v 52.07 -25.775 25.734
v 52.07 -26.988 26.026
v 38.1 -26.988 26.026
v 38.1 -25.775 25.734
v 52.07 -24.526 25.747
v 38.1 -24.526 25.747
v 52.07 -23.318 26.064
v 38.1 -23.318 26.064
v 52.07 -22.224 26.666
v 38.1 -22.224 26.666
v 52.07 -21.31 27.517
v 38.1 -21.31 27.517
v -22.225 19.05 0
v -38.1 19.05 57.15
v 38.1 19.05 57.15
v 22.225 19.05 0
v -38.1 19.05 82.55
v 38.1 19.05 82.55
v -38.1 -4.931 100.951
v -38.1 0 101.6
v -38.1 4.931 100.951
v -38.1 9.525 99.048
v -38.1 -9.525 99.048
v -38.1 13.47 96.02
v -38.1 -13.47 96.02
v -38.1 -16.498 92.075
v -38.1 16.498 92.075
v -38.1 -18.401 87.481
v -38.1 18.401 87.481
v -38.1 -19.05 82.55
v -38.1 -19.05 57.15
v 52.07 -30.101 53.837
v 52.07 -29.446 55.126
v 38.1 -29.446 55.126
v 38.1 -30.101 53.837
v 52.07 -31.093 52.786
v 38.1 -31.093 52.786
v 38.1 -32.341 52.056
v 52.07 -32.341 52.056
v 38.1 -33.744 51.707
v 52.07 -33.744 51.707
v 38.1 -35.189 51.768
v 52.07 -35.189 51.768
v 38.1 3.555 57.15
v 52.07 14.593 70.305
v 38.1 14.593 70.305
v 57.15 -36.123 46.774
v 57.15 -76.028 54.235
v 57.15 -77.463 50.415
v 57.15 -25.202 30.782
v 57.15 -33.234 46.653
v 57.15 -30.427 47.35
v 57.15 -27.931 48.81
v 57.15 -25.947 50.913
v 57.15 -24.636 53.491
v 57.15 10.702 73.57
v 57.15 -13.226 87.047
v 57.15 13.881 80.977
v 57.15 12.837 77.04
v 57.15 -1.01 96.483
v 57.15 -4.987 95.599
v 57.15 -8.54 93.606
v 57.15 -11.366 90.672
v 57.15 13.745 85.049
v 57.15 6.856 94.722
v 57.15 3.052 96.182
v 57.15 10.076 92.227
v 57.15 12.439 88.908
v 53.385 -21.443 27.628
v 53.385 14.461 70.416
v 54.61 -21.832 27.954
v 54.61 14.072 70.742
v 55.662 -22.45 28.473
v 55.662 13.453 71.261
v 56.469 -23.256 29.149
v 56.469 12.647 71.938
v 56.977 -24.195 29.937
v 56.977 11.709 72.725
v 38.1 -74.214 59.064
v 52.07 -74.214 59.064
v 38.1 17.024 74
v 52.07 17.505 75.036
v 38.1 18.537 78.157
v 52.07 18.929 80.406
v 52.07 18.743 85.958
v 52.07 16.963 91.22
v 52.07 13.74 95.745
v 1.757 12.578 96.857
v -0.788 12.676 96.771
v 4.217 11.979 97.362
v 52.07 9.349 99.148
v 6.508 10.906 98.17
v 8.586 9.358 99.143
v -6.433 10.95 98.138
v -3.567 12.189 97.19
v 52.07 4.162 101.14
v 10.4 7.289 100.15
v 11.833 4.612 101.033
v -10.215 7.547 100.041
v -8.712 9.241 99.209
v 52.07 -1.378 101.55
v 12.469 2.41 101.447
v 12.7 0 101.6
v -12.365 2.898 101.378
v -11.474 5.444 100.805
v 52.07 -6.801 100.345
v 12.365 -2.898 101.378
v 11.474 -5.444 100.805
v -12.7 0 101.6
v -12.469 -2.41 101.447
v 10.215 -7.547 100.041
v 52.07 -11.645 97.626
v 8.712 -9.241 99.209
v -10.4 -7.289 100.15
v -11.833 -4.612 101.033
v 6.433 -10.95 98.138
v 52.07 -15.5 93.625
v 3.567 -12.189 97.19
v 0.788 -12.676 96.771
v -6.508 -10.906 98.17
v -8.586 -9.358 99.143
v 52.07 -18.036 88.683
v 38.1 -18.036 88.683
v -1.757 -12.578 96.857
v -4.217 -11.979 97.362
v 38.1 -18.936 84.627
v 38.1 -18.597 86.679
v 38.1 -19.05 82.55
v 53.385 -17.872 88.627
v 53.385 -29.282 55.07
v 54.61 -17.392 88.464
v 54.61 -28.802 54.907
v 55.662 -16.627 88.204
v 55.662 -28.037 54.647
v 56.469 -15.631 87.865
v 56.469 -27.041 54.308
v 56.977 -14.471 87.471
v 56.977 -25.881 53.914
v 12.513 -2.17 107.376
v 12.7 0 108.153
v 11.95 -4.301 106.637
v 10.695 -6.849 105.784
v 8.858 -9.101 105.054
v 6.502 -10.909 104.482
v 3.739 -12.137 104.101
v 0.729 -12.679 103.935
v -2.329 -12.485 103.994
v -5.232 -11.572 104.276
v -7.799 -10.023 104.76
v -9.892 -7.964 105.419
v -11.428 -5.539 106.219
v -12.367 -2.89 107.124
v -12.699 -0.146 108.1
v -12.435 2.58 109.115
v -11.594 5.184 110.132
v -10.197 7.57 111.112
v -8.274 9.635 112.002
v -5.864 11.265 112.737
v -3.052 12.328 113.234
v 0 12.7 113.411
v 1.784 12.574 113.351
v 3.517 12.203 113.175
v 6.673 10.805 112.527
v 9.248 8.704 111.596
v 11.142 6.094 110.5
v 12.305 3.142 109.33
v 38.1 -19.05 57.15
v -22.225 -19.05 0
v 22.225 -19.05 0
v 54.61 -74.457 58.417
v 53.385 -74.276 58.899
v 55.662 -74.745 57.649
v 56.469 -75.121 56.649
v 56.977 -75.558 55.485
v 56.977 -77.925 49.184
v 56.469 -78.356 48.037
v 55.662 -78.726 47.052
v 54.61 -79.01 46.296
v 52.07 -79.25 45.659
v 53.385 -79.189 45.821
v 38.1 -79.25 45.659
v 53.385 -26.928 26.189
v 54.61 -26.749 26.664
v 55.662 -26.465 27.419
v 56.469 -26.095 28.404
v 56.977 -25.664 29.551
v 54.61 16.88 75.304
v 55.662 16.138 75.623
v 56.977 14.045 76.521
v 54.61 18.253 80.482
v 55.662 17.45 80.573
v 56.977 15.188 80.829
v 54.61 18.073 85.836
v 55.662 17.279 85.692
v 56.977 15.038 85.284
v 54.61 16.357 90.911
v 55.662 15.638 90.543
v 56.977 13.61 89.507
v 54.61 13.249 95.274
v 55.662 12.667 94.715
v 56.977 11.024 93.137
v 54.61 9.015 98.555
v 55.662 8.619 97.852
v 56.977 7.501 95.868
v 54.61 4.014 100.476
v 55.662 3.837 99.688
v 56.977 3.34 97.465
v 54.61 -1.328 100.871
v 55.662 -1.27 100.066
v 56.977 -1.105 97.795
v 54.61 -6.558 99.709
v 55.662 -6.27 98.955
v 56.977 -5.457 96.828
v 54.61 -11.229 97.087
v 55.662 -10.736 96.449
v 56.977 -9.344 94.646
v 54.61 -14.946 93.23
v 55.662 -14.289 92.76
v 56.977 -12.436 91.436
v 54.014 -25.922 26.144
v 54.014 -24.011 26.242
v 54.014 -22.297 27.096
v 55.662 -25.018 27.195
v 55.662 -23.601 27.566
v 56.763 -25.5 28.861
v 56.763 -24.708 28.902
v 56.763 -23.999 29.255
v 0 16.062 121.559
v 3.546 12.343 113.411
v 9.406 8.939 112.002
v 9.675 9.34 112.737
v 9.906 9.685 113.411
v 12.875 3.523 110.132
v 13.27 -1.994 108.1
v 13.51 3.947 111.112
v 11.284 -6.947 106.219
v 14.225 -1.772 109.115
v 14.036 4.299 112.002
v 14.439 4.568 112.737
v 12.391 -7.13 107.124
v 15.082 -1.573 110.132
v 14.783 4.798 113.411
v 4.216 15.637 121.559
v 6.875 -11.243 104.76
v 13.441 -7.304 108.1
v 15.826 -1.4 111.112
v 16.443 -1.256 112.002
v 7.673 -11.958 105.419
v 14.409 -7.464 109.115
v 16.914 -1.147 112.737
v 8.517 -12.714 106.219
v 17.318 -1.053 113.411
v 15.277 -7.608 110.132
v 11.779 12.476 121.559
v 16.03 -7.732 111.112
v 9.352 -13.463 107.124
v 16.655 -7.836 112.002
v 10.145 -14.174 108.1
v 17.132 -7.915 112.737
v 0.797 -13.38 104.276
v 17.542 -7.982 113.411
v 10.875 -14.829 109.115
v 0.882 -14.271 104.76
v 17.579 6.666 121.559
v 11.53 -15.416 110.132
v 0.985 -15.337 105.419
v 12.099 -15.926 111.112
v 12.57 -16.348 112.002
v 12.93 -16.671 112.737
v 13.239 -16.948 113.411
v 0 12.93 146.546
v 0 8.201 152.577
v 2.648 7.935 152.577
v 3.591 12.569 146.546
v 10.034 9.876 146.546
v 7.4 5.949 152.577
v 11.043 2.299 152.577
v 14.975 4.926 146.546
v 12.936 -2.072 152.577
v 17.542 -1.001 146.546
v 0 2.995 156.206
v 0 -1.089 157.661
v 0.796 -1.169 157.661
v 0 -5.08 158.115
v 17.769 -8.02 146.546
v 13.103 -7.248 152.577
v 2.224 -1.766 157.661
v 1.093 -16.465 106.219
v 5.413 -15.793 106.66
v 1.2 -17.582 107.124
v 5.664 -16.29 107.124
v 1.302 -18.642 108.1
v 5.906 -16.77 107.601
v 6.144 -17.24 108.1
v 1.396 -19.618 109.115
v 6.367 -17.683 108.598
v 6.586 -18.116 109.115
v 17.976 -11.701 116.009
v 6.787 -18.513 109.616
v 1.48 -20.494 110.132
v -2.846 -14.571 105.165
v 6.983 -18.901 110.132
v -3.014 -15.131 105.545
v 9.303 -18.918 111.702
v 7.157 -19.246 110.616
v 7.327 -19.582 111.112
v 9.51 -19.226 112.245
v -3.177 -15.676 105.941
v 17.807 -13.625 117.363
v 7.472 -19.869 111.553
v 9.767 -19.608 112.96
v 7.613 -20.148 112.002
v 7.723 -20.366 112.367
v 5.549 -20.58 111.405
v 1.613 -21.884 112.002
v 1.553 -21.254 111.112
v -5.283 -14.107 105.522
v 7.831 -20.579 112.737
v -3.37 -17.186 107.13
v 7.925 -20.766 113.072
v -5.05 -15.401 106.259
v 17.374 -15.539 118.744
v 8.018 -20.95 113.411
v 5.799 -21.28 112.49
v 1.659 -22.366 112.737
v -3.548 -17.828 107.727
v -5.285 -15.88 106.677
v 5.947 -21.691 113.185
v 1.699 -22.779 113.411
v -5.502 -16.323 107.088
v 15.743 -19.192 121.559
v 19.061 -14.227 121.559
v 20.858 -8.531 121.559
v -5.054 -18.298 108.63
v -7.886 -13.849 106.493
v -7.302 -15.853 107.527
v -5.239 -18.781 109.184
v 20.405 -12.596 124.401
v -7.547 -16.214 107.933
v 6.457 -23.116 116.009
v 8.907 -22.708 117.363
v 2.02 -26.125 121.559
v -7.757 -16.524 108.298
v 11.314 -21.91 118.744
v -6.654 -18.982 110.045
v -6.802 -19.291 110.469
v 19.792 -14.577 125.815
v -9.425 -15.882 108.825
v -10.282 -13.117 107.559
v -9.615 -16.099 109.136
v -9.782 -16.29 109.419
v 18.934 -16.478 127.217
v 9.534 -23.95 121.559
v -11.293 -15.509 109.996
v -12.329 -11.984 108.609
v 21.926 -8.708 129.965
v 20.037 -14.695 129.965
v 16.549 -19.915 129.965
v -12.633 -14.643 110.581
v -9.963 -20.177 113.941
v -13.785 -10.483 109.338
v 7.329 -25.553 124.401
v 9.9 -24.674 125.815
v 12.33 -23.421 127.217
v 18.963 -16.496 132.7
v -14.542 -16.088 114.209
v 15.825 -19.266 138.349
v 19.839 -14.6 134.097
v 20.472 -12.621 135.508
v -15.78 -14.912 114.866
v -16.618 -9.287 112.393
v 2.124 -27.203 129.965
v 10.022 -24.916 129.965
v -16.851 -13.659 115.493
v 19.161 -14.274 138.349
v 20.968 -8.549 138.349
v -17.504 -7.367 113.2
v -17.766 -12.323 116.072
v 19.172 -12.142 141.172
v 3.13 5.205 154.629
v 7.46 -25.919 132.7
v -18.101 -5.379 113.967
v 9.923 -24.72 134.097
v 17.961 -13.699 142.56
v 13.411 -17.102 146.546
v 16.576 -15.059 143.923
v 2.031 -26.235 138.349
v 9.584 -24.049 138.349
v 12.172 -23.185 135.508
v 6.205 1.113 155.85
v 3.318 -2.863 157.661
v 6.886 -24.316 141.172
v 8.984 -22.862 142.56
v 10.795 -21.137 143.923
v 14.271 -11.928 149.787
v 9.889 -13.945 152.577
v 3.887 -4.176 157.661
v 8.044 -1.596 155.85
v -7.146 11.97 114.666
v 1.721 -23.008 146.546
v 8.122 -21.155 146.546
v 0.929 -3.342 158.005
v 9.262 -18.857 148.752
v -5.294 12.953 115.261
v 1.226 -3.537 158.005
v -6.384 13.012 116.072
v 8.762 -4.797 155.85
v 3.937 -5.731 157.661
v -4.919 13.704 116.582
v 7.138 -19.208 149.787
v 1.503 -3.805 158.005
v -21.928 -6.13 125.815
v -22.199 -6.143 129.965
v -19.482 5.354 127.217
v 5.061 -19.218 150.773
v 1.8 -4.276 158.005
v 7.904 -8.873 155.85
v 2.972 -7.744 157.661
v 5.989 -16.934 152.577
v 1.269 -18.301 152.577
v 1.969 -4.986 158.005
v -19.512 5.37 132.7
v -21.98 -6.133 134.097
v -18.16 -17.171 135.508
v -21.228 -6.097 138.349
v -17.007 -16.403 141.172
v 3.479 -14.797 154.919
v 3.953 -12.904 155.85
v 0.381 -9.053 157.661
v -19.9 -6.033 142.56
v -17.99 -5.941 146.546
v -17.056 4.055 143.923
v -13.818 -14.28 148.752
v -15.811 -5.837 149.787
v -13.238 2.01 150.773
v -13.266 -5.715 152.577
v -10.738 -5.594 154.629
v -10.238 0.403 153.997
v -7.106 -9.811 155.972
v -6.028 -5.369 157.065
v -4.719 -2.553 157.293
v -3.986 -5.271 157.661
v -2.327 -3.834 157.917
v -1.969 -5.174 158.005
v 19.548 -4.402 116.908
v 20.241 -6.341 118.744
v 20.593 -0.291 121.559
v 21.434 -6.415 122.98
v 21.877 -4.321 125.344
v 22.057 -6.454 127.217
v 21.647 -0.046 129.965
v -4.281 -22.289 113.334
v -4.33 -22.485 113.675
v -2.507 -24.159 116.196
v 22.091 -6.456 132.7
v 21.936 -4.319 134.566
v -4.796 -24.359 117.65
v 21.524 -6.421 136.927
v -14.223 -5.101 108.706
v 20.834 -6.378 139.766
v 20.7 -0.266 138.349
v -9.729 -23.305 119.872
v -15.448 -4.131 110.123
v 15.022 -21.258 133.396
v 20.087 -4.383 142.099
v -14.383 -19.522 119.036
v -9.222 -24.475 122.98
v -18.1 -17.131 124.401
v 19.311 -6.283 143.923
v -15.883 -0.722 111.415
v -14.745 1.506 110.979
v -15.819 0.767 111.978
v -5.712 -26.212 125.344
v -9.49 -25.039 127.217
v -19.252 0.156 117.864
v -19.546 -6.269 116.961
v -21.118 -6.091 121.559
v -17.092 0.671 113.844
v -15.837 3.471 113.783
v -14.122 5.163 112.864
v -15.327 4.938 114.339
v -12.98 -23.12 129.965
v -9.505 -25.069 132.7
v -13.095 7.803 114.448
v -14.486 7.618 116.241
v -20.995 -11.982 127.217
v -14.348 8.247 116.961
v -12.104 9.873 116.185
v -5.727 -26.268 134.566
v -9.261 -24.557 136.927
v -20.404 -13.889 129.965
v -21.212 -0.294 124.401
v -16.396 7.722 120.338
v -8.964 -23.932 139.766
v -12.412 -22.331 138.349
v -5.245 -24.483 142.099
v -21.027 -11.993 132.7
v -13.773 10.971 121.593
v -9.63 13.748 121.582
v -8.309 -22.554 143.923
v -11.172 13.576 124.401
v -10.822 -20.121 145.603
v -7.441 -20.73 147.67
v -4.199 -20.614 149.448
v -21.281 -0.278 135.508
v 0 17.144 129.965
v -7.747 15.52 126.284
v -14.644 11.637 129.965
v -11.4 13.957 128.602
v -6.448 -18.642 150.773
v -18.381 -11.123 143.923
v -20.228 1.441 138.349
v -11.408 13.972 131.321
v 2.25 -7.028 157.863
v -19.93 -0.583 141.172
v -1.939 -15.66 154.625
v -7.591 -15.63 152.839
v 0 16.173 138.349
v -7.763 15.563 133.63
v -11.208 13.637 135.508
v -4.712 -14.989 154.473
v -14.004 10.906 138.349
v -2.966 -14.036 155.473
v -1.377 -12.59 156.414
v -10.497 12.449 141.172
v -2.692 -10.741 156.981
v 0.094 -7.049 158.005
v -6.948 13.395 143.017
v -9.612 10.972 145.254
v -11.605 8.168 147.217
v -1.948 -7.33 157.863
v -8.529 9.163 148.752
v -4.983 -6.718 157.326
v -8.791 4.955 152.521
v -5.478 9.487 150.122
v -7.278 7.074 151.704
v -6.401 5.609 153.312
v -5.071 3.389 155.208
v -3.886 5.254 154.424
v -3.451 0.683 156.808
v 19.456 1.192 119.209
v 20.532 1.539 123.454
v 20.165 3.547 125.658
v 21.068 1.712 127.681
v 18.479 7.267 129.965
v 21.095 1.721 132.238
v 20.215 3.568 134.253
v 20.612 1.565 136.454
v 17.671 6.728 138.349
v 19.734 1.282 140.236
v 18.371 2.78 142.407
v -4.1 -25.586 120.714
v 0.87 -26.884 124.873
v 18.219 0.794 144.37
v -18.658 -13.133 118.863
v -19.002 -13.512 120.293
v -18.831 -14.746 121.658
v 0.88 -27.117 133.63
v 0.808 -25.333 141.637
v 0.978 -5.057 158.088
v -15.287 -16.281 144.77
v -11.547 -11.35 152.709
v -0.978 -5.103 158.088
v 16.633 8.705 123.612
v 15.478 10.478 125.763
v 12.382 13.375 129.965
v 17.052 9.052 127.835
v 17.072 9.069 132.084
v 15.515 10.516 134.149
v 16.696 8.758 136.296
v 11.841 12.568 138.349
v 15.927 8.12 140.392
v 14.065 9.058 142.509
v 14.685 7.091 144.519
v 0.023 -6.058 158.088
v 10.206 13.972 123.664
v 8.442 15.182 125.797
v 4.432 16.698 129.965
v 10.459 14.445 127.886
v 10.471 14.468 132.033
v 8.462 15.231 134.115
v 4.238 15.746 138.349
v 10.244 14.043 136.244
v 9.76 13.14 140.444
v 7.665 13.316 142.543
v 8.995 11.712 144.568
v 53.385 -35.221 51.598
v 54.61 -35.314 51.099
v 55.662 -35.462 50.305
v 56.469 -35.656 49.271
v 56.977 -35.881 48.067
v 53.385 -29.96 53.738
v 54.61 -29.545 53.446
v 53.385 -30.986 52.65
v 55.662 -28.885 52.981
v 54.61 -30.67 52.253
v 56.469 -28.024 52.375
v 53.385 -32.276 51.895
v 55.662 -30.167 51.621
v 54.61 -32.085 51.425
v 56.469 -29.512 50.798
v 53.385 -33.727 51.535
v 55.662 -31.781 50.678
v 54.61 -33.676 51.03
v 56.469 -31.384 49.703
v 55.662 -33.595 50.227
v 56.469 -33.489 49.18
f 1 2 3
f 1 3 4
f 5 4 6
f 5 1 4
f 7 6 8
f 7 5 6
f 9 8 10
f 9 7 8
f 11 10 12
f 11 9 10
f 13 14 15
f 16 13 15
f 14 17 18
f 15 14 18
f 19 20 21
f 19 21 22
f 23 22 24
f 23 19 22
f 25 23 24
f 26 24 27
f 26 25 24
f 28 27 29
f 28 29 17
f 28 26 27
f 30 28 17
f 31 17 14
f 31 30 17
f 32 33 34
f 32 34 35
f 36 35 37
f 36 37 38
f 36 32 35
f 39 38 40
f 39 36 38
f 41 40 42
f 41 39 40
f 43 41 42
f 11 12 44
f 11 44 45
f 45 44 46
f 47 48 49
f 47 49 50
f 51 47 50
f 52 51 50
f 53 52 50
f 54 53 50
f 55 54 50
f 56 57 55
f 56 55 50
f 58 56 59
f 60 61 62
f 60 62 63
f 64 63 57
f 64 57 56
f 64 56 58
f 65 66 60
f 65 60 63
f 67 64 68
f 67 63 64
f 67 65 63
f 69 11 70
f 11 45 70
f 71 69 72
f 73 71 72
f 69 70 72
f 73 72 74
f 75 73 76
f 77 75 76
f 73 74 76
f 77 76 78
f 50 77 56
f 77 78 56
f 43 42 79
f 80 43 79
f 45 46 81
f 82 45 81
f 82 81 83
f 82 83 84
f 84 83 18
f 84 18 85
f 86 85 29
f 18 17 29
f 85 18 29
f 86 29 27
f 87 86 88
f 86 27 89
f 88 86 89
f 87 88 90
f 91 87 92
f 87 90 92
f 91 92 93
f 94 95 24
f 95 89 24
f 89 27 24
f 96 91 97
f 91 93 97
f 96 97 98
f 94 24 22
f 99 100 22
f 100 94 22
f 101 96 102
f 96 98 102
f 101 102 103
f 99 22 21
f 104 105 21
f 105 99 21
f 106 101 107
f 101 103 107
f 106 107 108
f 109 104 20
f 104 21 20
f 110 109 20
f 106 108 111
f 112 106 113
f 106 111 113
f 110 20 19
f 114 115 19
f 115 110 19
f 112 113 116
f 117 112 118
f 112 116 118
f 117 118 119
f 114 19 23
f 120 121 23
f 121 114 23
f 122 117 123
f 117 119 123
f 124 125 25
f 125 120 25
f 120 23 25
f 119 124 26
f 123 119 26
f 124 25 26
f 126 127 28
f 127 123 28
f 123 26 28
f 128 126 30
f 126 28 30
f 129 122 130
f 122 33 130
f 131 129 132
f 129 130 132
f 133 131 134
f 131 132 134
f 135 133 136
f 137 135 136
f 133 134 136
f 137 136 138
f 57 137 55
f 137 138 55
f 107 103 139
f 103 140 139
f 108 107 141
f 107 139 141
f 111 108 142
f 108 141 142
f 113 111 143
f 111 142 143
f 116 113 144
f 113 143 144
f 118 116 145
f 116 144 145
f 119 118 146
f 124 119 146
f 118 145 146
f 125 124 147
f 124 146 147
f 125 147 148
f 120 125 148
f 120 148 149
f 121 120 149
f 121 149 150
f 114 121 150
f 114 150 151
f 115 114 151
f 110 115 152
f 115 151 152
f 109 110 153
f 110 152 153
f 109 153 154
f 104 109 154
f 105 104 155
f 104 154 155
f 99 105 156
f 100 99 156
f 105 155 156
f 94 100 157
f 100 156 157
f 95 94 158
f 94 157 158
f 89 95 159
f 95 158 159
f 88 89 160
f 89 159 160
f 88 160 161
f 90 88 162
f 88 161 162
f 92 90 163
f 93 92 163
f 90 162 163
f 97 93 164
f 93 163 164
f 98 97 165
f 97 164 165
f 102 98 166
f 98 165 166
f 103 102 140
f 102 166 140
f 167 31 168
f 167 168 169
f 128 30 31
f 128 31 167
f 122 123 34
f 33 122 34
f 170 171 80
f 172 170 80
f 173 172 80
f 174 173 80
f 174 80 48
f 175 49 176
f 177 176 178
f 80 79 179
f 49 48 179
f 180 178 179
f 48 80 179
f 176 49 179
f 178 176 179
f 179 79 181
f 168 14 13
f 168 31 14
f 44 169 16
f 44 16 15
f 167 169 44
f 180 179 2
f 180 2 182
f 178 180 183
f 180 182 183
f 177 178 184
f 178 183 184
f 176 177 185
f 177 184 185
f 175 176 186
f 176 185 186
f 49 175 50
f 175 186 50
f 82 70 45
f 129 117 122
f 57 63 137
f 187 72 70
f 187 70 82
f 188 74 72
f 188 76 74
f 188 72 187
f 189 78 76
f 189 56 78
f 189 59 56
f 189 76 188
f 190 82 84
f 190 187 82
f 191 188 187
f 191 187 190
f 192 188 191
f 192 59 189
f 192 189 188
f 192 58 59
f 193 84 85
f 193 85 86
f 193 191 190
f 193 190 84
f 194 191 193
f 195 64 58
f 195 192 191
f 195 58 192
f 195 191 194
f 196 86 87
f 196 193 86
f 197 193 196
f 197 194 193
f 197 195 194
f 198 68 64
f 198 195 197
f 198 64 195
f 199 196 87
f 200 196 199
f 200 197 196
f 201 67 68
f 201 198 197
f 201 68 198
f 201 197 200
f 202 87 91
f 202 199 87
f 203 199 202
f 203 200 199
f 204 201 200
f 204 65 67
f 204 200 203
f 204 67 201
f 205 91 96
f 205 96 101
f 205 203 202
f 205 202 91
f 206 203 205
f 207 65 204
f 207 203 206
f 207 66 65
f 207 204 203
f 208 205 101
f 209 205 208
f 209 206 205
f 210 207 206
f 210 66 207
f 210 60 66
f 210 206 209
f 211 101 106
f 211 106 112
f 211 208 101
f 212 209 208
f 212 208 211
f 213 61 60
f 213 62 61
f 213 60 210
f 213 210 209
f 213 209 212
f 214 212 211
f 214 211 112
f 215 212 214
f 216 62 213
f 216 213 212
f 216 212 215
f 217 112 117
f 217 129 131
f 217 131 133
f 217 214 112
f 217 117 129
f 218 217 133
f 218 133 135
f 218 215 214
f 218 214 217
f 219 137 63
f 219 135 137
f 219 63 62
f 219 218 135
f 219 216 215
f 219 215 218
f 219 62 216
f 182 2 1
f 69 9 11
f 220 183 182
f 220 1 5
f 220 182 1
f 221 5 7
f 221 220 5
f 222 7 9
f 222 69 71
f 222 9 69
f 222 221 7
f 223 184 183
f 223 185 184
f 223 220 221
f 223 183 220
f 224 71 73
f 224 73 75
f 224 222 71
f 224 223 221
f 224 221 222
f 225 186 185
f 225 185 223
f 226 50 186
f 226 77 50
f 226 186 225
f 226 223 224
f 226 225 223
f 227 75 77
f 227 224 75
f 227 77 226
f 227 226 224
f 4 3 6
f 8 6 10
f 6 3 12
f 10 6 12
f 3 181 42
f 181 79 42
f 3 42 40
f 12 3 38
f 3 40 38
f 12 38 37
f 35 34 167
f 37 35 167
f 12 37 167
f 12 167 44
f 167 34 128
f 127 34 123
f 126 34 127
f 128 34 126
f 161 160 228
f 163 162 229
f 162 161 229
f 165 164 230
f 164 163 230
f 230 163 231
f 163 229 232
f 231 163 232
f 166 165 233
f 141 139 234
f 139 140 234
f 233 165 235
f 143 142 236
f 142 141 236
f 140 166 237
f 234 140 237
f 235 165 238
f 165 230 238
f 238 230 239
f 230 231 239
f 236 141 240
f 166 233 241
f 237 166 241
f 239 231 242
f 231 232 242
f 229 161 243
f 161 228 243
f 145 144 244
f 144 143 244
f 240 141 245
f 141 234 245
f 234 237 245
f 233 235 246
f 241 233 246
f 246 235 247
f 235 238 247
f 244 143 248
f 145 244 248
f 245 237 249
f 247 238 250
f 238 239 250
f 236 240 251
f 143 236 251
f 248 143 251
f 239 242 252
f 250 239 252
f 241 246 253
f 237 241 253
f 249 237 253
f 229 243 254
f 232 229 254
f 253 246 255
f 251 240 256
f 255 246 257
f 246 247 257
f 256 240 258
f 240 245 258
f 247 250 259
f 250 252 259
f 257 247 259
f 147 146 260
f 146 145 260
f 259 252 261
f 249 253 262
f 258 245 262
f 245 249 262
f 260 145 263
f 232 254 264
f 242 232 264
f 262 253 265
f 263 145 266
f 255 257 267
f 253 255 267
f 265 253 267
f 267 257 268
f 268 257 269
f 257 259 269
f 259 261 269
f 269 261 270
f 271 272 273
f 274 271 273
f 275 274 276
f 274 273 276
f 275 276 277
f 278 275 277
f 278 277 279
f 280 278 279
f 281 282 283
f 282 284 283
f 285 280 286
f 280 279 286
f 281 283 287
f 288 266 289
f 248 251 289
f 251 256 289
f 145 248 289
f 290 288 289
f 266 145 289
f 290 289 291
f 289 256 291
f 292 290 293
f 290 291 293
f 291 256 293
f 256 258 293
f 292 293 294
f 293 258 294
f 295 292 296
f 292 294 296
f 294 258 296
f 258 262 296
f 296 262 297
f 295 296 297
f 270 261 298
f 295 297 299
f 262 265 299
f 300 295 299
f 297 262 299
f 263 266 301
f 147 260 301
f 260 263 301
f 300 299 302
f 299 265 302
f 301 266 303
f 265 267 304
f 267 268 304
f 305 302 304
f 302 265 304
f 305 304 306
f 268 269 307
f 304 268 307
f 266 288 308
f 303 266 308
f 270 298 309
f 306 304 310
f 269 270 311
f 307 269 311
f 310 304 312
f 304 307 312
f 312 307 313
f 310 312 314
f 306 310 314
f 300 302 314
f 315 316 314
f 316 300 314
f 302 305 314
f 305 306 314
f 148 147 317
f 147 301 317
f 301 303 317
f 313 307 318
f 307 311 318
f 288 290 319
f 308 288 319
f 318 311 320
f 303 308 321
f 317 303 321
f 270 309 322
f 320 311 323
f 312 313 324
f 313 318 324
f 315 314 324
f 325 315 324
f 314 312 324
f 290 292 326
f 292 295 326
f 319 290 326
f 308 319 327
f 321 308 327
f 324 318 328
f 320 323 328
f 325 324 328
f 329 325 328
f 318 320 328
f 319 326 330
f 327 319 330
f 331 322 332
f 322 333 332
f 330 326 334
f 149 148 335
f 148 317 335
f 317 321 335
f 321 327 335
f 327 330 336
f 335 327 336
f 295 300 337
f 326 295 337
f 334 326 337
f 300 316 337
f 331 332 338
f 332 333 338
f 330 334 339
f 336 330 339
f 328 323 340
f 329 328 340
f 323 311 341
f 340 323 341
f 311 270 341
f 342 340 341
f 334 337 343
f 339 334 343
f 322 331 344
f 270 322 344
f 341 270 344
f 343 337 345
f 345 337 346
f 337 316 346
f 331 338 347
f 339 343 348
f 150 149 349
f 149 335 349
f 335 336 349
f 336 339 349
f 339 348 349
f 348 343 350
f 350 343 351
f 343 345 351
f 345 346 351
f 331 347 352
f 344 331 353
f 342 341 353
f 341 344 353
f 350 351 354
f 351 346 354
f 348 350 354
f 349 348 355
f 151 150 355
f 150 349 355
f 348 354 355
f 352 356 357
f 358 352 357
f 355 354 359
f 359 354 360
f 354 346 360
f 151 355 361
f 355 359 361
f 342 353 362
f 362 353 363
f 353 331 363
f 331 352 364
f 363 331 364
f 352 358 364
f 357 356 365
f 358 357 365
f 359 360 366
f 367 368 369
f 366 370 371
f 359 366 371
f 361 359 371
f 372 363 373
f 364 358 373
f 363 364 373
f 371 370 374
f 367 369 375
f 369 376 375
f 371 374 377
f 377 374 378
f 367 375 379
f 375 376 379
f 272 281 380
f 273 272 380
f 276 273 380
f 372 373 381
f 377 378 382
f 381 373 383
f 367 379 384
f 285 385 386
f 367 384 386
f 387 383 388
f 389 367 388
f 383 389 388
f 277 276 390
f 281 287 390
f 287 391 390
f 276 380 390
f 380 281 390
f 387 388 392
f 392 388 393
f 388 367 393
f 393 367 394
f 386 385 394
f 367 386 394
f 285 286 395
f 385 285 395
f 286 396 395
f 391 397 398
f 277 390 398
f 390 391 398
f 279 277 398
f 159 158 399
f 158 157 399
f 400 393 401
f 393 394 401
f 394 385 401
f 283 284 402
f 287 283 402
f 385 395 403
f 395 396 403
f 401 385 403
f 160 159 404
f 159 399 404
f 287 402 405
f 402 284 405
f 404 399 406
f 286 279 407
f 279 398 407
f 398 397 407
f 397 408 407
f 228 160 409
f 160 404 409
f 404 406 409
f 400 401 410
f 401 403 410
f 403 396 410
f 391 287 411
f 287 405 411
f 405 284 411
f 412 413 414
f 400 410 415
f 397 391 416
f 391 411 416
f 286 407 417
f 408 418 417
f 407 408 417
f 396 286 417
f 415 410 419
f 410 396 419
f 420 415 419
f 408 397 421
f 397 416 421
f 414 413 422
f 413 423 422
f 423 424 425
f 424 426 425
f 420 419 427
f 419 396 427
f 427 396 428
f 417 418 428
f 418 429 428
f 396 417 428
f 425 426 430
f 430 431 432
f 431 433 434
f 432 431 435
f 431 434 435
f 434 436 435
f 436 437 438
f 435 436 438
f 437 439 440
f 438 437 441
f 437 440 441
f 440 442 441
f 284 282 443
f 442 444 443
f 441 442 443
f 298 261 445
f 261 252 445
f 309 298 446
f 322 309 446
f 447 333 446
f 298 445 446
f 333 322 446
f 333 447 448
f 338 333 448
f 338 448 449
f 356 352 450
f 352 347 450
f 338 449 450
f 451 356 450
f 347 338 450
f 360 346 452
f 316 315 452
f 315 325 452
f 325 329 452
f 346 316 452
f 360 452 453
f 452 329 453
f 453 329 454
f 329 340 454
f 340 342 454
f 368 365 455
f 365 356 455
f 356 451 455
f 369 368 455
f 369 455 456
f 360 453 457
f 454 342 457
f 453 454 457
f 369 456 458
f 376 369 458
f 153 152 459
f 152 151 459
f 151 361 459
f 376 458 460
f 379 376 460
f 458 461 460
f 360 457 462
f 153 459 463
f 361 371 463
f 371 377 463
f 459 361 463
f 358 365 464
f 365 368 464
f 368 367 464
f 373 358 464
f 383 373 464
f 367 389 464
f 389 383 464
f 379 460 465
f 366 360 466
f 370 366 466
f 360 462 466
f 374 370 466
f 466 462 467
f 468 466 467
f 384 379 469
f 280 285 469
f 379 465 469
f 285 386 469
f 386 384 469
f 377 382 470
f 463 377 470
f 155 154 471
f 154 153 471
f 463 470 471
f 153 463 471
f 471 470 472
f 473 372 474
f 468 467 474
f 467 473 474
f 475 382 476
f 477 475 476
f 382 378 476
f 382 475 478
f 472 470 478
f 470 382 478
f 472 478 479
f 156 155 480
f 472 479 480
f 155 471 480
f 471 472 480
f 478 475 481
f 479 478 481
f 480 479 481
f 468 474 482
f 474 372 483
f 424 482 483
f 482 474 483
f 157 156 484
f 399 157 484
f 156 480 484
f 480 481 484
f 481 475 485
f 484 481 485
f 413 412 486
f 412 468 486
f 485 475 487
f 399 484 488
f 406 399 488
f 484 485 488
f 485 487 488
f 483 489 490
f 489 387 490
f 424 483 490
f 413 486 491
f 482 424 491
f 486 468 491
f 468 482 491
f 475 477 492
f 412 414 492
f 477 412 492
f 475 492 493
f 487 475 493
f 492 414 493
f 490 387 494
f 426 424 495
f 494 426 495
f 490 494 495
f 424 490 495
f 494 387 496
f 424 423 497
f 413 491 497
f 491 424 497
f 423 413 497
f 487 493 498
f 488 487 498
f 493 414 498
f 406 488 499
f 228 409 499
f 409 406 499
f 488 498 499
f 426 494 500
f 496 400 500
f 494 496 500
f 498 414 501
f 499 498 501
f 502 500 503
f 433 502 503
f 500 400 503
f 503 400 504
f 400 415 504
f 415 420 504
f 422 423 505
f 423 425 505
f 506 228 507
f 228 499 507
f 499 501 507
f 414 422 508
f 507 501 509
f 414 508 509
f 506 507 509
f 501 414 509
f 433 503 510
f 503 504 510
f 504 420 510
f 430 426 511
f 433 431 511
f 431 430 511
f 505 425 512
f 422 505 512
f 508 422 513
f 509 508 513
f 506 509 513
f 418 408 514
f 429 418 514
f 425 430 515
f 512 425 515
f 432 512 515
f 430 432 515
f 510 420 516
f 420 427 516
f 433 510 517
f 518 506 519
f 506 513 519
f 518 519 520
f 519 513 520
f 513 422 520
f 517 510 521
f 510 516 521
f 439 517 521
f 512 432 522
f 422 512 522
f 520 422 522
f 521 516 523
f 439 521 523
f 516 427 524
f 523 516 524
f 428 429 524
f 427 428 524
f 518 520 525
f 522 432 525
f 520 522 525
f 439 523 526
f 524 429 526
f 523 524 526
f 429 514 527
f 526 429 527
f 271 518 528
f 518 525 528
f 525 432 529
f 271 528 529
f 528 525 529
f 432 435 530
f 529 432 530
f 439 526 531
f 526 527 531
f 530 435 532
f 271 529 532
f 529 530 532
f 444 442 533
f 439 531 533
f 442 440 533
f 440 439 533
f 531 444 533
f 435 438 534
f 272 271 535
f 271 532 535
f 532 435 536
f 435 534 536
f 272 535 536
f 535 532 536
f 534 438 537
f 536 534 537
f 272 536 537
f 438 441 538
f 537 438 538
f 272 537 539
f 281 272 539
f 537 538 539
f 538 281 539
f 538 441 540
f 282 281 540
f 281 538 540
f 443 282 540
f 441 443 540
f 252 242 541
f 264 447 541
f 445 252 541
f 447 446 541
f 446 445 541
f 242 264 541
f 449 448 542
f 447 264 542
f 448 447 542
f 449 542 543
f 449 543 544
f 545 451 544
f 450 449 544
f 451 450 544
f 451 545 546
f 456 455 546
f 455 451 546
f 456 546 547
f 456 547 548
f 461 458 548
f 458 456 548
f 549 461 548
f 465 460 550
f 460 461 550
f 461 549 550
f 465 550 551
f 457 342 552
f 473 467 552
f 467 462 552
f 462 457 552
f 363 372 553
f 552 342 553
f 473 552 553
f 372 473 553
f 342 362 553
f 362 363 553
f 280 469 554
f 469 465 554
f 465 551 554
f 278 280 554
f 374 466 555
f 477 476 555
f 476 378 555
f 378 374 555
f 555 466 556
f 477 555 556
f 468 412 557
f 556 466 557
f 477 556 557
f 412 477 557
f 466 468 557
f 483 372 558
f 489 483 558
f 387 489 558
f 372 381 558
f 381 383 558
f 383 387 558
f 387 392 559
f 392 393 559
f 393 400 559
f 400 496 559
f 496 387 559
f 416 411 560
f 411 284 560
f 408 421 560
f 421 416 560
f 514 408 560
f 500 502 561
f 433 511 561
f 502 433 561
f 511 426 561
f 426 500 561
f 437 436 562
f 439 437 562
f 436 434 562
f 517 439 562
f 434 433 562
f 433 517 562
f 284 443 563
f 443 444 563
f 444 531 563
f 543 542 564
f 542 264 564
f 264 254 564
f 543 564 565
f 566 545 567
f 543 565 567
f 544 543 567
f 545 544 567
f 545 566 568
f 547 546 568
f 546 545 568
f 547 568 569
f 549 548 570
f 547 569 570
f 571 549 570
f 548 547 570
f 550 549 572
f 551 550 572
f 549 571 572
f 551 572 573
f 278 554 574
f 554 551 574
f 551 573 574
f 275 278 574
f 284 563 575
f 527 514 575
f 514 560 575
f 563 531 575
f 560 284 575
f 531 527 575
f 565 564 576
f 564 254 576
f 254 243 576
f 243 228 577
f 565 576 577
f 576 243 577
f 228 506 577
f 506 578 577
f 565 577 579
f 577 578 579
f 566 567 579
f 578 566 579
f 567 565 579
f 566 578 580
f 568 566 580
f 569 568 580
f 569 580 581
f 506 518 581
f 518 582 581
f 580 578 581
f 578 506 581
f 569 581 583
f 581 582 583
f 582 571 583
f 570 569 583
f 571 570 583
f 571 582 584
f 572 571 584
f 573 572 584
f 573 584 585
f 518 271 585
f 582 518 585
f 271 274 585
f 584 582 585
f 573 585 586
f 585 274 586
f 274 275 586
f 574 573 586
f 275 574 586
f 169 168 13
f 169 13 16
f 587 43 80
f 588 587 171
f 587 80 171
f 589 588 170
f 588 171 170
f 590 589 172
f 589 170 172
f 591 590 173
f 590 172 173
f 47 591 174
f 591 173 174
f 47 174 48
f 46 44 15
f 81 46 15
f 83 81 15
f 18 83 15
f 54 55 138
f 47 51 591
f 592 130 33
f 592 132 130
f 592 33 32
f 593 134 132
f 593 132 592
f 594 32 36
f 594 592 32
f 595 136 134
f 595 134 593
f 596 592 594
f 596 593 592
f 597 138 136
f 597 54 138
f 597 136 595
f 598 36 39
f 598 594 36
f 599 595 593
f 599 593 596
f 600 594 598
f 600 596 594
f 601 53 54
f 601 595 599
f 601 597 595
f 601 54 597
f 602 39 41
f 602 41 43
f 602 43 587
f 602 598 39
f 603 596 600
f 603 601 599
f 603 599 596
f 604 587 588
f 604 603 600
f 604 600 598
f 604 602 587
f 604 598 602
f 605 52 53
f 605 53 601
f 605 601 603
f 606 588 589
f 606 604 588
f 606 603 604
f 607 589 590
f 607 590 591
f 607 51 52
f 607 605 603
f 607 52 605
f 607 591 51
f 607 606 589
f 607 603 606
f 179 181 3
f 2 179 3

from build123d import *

# Parameters (mm, degrees)
F1_DEPTH    = 19.05
F2_T1_DEPTH = 171.45
F3_W        = 12.7
F3_H        = 38.1
F8_DEPTH    = 19.05
F9_R        = 5.08
F10_R       = 5.08
F11_R       = 5.08


# Not quite as in the source:
# - a fillet or chamfer that OpenCascade refuses, or shapes differently, is made with other operations: its cross-section is extruded or revolved along the edge and cut away or added


with BuildPart() as f1:
    # F0 (on Front) → F1 (new body, symmetric)
    with BuildSketch(Plane.XZ):
        Polygon((-38.1, 57.15), (-22.225, 0), (22.225, 0), (38.1, 57.15), (38.1, 101.6), (-38.1, 101.6), align=None)
    extrude(amount=F1_DEPTH, both=True)

    # F2: fillet of radius 19.05 on 2 edges, made by hand

    # F2_s2 → F2_t1 (cut)
    with BuildSketch(Plane.YZ.offset(-85.725)):
        with BuildLine():
            ThreePointArc((0, 101.6), (-13.4703841816, 96.0203841816), (-19.05, 82.55))
            Line((-19.05, 82.55), (-19.05, 101.6))
            Line((-19.05, 101.6), (0, 101.6))
        make_face()
        with BuildLine():
            ThreePointArc((0, 101.6), (13.4703841816, 96.0203841816), (19.05, 82.55))
            Line((19.05, 82.55), (19.05, 101.6))
            Line((19.05, 101.6), (0, 101.6))
        make_face()
    extrude(amount=F2_T1_DEPTH, mode=Mode.SUBTRACT)

    # F3 (on Front) → F4 (revolve)
    with BuildSketch(Plane.XZ):
        with Locations((6.35, 101.6)):
            Rectangle(F3_W, F3_H)
    revolve(axis=Axis((0, 0, 41.275), (0, 0, -1)))

    # F5 (on Right) → F6 (revolve)
    with BuildSketch(Plane.YZ):
        with BuildLine():
            Line((-5.08, 158.115), (-5.08, 102.235))
            add(Edge.make_bspline(
                [(-5.08, 102.235), (17.145, 102.235), (17.145, 130.175), (17.145, 158.115), (-5.08, 158.115)],
                knots=[3.1415926536, 3.1415926536, 3.1415926536, 4.7123889804, 4.7123889804, 6.2831853072, 6.2831853072, 6.2831853072], degree=2, weights=[1, 0.7071067812, 1, 0.7071067812, 1]))
        make_face()
    revolve(axis=Axis((0, -5.08, 55.275326029), (0, 0, -1)))

    # F7 (on face) → F8 (join)
    with BuildSketch(Plane.YZ.offset(38.1)):
        with BuildLine():
            Line((-23.622, 24.761857734), (14.5931466414, 70.3048960355))
            ThreePointArc((14.5931466414, 70.3048960355), (9.3486979196, 99.1483236264), (-18.0359002739, 88.6826015123))
            Line((-18.0359002739, 88.6826015123), (-30.8627206832, 50.9590916336))
            Line((-30.8627206832, 50.9590916336), (-74.213960244, 59.0636453196))
            Line((-74.213960244, 59.0636453196), (-79.2495722325, 45.6589880743))
            Line((-79.2495722325, 45.6589880743), (-23.622, 24.761857734))
        make_face()
    extrude(amount=F8_DEPTH)

    # F9
    f9_edges = [f1.edges().sort_by_distance(p)[0] for p in [
        (47.625, -30.862721, 50.959092),
    ]]
    fillet(f9_edges, radius=F9_R)

    # F10
    f10_edges = [f1.edges().sort_by_distance(p)[0] for p in [
        (47.625, -23.622, 24.761858),
    ]]
    fillet(f10_edges, radius=F10_R)

    # F11
    f11_edges = [f1.edges().sort_by_distance(p)[0] for p in [
        (57.15, -3.358654, 48.910773),
        (57.15, -53.118999, 35.842741),
        (57.15, -23.91241, 25.868412),
        (57.15, -54.701473, 55.415768),
        (57.15, -31.691239, 52.376034),
        (57.15, -23.740888, 71.904309),
        (57.15, 9.348698, 99.148324),
    ]]
    fillet(f11_edges, radius=F11_R)


solid = f1.part
